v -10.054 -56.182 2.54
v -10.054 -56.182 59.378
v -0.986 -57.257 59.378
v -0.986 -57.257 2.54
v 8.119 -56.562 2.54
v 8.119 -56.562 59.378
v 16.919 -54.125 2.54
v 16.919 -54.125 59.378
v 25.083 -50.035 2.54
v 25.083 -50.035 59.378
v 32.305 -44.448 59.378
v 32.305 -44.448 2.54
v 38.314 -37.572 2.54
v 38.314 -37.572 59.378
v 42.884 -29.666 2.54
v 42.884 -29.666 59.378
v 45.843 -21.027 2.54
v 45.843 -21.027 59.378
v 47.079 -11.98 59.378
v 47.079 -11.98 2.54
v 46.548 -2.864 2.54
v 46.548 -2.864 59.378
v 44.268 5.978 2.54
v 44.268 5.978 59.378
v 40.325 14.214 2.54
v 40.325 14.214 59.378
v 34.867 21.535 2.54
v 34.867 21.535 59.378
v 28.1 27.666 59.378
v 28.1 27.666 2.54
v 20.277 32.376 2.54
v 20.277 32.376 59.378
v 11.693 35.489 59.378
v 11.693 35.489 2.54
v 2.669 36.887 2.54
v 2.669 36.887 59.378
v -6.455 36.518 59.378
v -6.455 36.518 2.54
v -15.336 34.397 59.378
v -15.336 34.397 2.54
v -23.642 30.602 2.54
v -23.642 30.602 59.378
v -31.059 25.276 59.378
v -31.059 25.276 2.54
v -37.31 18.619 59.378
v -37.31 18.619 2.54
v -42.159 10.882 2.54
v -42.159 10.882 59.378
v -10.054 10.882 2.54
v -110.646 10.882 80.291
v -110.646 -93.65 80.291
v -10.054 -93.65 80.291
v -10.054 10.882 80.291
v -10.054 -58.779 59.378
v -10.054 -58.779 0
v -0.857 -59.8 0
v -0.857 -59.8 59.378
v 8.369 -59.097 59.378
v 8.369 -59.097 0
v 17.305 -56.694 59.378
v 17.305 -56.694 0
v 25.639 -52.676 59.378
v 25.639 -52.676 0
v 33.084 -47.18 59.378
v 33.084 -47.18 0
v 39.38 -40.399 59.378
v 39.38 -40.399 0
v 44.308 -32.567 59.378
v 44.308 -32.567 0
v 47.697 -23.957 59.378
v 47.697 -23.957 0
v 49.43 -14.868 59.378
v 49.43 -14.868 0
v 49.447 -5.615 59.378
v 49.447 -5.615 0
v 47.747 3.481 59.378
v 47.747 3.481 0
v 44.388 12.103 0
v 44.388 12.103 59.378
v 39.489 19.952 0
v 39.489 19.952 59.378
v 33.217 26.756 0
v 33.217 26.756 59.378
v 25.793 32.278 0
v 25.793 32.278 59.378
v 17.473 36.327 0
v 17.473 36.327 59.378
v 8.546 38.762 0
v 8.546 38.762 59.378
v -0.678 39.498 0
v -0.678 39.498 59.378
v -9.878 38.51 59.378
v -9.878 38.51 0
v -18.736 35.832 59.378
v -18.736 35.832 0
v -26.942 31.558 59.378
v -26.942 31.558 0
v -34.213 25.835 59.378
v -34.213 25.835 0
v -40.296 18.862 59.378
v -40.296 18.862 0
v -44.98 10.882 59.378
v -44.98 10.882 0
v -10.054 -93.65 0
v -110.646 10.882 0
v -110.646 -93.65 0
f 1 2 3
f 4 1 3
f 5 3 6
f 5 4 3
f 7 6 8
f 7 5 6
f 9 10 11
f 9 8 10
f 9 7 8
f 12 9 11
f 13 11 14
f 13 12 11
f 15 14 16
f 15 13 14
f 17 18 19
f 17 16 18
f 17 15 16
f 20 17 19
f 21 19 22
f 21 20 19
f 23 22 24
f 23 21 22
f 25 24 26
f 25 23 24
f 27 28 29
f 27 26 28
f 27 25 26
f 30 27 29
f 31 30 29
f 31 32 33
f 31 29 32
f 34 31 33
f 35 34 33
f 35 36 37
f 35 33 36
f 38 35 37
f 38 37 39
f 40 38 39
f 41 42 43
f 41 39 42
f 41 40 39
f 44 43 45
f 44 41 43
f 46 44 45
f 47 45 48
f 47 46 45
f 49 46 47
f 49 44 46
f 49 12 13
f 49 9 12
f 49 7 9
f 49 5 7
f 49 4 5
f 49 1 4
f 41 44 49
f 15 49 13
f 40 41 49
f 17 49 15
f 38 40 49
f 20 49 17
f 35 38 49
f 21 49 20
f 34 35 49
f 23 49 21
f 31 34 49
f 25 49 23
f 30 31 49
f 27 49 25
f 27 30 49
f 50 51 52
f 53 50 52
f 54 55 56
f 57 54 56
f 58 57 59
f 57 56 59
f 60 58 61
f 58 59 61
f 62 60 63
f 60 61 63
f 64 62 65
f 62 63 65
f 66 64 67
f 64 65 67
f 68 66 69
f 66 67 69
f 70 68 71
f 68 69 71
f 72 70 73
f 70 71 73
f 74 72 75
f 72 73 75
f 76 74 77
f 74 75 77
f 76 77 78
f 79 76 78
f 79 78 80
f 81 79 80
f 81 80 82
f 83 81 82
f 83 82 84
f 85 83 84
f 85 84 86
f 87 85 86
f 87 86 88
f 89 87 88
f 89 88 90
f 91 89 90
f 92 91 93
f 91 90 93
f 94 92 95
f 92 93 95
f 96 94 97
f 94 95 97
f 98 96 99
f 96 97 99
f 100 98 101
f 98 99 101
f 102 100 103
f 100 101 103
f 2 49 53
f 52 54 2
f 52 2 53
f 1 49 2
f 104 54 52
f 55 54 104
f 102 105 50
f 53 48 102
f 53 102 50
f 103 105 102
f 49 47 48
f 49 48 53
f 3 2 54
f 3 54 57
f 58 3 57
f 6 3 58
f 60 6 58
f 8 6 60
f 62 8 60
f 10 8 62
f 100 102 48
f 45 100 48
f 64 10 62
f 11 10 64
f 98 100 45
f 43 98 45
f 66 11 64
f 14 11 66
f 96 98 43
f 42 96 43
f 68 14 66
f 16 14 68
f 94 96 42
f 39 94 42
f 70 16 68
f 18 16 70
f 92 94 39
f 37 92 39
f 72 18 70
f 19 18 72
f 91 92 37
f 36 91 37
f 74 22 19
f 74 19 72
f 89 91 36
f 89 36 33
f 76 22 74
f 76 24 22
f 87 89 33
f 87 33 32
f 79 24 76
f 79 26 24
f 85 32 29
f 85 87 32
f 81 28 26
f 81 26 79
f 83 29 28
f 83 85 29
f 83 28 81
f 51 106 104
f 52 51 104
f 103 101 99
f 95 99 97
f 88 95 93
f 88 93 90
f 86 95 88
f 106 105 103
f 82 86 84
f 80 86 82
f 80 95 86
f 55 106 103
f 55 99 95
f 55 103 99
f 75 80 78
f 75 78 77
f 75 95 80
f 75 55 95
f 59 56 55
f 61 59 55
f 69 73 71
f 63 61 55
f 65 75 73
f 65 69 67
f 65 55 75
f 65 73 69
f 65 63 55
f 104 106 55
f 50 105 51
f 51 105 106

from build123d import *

# Parameters (mm, degrees)
F0_R     = 49.654928
F1_DEPTH = 59.378261
F2_T     = -2.54
F3_W     = 100.591485
F3_H     = 104.532239
F4_DEPTH = 80.290629


with BuildPart() as f1:
    # F0 (on Top) → F1 (new body)
    with BuildSketch(Plane.XY):
        with Locations((0, -10.152236)):
            Circle(F0_R)
    extrude(amount=F1_DEPTH)

    # F2
    f2_openings = [f1.faces().sort_by_distance(p)[0] for p in [
        (0, -10.152236, 59.378261),
    ]]
    offset(amount=F2_T, openings=f2_openings)

    # F3 (on face) → F4 (join)
    with BuildSketch(Plane(origin=(0, 0, 0), x_dir=(1, 0, 0), z_dir=(0, 0, -1))):
        with Locations((-60.349798, 41.384102)):
            Rectangle(F3_W, F3_H)
    extrude(amount=-F4_DEPTH)


solid = f1.part
